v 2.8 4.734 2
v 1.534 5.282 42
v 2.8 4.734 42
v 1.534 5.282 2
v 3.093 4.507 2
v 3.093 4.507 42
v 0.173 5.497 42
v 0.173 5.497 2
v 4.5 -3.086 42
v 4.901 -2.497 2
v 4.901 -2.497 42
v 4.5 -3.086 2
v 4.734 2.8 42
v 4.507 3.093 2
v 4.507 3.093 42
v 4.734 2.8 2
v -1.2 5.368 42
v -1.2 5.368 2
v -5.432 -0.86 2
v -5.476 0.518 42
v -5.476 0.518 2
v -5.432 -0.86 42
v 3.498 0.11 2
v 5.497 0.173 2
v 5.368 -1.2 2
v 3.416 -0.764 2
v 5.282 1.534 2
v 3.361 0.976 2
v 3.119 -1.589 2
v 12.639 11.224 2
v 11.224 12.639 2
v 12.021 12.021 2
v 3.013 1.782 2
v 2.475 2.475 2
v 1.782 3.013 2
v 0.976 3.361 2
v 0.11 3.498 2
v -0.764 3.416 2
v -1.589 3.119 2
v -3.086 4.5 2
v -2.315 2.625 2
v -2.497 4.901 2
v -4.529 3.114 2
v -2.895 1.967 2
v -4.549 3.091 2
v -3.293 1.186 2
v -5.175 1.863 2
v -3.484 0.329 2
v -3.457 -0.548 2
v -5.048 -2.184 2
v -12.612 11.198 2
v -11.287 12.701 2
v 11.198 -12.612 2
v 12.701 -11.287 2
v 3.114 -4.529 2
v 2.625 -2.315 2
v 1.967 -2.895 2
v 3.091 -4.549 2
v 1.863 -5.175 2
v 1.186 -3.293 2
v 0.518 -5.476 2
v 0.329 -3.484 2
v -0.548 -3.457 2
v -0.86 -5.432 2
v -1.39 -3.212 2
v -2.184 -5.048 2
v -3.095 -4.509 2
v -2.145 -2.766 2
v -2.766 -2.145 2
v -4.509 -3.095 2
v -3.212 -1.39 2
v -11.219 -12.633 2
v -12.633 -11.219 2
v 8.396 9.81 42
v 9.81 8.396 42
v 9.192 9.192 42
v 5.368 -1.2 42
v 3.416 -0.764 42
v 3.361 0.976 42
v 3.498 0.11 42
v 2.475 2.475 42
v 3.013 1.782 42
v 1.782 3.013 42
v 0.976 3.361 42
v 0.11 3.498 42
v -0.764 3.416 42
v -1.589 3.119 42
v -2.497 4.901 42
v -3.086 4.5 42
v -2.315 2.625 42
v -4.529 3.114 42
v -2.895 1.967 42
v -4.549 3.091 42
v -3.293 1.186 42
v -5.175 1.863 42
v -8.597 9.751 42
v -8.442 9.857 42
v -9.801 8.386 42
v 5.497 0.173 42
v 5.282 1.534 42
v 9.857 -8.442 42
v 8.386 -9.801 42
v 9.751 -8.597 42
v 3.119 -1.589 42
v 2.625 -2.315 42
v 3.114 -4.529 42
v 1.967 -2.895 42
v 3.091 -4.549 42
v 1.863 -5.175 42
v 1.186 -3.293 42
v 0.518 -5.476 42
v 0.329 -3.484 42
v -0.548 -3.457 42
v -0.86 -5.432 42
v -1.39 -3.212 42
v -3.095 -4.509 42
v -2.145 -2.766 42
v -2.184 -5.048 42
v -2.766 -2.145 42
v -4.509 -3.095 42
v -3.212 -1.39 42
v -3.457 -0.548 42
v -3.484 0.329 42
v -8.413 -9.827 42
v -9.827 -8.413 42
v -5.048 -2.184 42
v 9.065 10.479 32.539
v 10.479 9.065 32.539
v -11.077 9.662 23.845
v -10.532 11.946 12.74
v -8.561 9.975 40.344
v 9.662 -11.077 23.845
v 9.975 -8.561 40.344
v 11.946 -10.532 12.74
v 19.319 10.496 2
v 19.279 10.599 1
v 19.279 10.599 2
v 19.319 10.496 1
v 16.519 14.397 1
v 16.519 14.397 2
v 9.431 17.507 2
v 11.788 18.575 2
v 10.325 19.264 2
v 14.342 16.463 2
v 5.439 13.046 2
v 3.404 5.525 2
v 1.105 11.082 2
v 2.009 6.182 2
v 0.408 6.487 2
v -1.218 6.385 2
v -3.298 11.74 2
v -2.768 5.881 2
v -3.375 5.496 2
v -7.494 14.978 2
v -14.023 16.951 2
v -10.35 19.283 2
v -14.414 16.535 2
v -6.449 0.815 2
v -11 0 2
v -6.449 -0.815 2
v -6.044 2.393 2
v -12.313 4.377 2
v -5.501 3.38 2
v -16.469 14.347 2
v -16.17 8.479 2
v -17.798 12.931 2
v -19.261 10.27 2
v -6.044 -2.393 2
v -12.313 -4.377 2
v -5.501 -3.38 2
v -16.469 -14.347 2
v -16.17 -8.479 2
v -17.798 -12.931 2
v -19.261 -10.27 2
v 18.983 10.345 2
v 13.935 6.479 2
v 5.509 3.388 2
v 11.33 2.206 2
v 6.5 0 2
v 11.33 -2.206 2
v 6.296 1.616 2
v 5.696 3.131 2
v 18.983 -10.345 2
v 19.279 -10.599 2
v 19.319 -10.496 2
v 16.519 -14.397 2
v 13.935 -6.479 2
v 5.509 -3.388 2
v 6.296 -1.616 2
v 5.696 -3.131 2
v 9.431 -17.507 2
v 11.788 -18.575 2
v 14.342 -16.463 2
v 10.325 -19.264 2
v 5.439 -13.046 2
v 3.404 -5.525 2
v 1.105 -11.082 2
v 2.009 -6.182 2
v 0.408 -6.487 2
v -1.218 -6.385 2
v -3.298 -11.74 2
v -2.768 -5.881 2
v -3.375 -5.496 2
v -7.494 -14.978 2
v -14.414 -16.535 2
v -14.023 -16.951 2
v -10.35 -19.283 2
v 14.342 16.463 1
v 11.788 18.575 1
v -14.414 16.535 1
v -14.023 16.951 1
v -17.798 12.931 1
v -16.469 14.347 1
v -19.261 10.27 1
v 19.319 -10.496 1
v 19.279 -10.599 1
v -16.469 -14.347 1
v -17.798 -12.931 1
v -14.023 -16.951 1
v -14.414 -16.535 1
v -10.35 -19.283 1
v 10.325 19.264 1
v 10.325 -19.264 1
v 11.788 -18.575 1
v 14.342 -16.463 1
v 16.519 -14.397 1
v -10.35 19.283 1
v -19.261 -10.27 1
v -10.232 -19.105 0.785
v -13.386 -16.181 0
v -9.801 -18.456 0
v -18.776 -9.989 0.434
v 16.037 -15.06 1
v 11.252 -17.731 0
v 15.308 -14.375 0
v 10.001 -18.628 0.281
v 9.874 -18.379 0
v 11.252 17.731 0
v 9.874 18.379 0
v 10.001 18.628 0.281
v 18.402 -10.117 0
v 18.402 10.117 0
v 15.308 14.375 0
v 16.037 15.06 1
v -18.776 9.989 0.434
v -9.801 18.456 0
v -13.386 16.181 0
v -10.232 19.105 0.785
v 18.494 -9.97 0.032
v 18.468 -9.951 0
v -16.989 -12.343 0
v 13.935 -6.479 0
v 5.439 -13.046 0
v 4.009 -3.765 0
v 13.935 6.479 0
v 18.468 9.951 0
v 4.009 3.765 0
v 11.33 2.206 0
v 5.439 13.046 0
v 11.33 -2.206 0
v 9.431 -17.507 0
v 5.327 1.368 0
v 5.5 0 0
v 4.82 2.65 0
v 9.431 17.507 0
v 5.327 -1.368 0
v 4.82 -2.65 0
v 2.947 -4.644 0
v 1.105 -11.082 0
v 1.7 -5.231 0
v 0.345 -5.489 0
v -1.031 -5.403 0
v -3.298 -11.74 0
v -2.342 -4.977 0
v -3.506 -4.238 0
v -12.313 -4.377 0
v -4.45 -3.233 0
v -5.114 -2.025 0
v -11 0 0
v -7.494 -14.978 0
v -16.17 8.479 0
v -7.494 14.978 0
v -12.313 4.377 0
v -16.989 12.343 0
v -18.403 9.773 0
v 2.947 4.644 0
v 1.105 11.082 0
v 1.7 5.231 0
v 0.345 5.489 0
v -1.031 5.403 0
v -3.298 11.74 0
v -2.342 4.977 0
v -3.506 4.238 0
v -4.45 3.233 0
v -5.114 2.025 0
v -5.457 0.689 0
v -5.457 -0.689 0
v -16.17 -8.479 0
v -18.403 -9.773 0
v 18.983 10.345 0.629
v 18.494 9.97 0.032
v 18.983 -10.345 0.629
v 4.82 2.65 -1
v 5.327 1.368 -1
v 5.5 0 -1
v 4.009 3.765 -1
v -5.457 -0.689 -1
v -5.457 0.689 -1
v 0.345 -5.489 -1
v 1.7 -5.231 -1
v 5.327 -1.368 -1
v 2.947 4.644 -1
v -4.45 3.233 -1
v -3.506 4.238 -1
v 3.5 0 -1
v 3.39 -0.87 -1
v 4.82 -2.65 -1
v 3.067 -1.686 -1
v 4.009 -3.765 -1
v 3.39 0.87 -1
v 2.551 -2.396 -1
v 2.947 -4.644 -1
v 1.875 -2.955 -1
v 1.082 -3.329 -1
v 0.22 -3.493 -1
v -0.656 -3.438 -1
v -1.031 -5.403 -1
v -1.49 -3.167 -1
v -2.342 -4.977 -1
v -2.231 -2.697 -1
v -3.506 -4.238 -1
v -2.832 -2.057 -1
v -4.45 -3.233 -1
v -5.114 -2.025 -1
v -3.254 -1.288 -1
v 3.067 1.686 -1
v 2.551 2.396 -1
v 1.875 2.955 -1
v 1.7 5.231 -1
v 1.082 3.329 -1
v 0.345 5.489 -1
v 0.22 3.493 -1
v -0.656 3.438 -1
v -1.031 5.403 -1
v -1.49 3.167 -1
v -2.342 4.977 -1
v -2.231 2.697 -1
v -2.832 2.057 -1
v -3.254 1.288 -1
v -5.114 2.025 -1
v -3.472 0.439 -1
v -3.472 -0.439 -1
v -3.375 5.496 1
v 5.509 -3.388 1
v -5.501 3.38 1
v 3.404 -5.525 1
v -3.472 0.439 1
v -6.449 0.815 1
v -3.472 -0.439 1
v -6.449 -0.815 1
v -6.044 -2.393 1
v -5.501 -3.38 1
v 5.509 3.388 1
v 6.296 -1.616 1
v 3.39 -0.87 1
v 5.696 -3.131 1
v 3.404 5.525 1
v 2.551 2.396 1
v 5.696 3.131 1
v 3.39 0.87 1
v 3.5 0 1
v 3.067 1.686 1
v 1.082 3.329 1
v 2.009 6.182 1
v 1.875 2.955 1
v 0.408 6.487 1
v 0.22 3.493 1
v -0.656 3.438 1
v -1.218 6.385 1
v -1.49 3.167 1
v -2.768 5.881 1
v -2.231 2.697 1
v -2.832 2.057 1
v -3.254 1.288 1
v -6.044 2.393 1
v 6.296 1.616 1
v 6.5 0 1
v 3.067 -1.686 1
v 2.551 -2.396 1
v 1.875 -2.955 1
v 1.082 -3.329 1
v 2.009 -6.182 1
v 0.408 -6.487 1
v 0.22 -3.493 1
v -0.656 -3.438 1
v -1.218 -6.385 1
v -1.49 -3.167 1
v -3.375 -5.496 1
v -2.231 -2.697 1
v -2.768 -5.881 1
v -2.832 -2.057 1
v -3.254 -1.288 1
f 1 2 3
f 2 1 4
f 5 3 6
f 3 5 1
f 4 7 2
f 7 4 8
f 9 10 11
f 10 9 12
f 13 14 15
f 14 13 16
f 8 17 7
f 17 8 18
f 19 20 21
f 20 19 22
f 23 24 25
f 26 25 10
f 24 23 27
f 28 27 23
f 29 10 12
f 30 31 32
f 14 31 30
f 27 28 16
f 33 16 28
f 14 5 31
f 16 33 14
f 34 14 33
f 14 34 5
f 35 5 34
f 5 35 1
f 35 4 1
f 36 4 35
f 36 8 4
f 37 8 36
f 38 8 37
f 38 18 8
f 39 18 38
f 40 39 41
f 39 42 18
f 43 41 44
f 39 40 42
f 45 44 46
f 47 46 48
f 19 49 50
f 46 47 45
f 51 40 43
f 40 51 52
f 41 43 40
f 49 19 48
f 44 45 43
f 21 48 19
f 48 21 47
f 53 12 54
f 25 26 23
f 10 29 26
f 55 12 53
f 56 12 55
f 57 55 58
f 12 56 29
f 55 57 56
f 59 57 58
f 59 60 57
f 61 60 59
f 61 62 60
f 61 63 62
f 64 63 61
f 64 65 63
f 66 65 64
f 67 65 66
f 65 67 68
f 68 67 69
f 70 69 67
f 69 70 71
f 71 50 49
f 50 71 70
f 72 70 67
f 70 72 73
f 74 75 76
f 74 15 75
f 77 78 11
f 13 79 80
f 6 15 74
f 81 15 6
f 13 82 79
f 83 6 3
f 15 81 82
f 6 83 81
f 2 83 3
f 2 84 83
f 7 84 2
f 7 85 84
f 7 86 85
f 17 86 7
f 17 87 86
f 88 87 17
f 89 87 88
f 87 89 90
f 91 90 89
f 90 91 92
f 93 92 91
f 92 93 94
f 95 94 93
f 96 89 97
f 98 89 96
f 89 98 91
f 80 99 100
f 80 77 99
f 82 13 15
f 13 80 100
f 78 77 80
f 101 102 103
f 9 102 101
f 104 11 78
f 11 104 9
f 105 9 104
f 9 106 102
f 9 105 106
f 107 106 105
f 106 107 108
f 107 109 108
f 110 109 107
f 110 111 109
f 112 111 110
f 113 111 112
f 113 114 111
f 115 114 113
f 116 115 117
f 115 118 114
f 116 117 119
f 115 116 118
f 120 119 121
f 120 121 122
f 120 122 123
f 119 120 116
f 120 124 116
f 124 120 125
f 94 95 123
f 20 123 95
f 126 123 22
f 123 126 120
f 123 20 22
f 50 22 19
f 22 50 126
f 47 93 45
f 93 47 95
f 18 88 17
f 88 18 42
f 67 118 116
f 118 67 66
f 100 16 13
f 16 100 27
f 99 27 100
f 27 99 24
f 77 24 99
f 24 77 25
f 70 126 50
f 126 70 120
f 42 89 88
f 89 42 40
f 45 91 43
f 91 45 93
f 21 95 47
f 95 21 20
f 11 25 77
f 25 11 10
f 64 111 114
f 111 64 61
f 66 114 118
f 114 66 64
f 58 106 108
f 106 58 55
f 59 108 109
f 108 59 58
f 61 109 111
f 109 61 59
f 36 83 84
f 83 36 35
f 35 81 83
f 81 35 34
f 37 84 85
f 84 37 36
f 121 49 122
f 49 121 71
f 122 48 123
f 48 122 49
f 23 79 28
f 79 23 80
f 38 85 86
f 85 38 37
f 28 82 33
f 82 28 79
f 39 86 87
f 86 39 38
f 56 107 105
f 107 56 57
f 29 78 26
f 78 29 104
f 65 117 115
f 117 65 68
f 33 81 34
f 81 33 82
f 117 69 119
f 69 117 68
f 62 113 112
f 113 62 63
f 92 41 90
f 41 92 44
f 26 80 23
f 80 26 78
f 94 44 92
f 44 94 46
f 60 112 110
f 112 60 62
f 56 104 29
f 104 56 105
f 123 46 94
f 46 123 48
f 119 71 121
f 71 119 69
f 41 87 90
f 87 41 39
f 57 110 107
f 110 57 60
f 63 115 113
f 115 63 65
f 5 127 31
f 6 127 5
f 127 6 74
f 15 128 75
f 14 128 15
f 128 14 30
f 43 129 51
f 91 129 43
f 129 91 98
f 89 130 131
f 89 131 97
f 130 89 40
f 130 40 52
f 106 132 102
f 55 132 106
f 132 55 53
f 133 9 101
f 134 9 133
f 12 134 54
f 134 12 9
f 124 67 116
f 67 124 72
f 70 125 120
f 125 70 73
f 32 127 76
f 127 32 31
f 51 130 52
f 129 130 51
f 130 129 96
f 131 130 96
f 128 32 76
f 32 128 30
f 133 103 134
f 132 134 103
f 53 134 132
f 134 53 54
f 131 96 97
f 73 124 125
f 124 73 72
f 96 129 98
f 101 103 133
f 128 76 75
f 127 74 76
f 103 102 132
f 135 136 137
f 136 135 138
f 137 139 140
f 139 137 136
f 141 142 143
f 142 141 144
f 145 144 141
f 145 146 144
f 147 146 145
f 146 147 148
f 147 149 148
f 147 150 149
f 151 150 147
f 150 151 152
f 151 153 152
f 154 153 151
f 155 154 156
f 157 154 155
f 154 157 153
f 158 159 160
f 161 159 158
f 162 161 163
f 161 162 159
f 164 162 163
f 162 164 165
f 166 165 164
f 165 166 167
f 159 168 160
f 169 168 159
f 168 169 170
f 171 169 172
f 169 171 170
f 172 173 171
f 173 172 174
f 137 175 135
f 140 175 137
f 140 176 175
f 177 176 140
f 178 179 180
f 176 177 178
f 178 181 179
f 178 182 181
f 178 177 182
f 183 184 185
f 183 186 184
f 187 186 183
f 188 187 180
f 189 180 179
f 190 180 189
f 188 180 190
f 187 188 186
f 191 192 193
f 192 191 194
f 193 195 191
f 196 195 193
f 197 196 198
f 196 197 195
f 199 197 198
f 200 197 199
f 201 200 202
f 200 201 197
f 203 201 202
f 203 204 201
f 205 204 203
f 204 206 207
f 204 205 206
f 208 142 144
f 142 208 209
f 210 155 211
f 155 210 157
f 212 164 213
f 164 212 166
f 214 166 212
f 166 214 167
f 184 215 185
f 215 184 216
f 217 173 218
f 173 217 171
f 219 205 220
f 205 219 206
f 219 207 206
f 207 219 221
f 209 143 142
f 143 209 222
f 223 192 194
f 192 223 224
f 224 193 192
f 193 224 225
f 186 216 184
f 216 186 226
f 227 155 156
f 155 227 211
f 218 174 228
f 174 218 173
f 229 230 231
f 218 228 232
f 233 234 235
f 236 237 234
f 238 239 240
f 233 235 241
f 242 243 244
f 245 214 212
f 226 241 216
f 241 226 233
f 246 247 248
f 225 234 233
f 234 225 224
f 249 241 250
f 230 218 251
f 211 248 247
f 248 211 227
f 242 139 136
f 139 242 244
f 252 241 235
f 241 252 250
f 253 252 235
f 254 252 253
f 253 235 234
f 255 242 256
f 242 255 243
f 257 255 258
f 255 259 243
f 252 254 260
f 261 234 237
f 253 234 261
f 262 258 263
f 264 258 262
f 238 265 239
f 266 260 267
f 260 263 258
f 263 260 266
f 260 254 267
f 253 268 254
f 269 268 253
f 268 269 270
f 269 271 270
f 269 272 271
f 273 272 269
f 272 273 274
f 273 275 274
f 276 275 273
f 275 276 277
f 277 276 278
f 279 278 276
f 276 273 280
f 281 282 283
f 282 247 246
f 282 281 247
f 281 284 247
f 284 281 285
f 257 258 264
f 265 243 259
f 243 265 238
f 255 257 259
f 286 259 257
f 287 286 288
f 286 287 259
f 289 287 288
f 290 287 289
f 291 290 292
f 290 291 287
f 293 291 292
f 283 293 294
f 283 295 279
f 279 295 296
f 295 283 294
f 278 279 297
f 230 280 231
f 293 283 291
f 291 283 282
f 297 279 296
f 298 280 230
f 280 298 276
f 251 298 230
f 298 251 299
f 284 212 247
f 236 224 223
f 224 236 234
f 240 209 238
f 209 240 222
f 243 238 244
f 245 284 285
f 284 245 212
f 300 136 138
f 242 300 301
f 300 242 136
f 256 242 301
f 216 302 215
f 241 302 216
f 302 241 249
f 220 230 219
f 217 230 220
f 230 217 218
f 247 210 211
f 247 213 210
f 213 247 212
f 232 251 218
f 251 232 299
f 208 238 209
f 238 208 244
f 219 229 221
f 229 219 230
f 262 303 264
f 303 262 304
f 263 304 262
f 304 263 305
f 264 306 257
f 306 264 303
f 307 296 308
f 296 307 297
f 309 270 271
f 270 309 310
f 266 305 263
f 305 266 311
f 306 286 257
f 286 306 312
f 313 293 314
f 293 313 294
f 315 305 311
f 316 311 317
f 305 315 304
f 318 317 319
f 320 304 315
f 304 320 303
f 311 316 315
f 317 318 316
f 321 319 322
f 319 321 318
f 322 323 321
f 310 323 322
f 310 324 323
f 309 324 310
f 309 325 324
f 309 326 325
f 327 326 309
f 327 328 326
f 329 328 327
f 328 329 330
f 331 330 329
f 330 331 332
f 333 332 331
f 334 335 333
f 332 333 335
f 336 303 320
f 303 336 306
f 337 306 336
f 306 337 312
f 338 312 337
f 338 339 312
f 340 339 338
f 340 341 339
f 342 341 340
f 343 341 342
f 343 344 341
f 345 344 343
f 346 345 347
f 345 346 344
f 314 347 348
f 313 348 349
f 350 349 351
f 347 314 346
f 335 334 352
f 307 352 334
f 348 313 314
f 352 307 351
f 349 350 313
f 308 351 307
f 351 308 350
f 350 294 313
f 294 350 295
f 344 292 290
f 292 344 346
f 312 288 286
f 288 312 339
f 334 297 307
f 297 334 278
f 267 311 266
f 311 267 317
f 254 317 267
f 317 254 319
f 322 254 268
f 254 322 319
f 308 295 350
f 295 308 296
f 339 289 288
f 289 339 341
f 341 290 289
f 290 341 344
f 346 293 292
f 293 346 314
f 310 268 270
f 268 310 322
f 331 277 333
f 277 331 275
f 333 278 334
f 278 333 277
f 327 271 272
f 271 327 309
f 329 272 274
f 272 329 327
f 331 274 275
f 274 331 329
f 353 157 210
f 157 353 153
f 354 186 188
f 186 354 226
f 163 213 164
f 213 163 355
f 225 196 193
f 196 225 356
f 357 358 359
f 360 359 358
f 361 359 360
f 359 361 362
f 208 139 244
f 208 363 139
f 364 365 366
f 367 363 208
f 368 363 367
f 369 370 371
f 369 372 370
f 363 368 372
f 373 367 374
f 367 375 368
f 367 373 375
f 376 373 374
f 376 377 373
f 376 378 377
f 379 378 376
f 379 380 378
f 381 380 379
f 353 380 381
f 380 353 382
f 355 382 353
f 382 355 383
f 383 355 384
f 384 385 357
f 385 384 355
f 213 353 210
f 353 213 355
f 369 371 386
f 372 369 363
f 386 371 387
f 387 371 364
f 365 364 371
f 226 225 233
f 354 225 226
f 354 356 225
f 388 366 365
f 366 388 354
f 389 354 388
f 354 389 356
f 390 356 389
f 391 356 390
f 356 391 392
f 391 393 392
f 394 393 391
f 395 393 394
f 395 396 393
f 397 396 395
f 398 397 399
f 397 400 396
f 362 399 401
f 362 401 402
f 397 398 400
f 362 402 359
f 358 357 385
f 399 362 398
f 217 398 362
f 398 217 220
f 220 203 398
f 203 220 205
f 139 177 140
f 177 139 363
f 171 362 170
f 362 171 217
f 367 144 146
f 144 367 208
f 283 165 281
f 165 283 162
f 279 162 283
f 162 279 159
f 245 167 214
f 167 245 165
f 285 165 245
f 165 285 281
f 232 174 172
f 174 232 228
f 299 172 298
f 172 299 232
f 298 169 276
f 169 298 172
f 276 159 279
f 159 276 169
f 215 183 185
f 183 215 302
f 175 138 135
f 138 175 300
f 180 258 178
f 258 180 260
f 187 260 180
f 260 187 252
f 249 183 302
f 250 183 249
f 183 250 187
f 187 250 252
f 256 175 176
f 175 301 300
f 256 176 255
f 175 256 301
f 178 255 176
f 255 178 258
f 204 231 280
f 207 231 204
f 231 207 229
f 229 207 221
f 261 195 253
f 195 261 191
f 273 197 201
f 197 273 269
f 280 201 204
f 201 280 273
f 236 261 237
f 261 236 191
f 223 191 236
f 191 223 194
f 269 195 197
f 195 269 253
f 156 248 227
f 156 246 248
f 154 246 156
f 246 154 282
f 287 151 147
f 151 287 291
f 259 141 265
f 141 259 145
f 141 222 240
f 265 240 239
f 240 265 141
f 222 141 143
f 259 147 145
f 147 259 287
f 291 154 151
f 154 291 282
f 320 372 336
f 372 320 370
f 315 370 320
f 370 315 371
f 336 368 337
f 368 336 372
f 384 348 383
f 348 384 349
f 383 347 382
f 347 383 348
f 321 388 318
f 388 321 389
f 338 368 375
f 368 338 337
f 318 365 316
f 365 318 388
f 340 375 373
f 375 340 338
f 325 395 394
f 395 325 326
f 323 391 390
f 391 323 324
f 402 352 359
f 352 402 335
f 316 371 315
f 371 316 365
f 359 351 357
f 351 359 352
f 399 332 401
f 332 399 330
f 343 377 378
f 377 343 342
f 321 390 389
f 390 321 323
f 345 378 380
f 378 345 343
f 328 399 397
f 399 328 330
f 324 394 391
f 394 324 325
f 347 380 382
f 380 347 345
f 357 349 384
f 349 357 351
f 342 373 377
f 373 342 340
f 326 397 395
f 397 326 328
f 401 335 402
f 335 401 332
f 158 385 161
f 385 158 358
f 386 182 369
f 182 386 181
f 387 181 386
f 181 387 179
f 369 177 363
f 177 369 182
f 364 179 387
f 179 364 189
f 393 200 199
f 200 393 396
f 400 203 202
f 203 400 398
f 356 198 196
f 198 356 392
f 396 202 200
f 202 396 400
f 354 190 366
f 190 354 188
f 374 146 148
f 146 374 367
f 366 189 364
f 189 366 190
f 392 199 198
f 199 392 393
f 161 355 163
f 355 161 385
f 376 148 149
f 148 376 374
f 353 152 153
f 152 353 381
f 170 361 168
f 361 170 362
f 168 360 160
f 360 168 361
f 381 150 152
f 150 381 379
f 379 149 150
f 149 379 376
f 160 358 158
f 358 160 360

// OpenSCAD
$fn=25;
d1 = 34;
d2 = 26;
d3 = 7;
h = 40;

module holder() {

    intersection(){
        union(){
            rotate([0,0,0]) translate([d3/2,-1,0]) cube([d1/2,2,h]);

            rotate([0,0,90]) translate([d3/2,-1,0]) cube([d1/2,2,h]);

            rotate([0,0,-90]) translate([d3/2,-1,0]) cube([d1/2,2,h]);

            rotate([0,0,180]) translate([d3/2,-1,0]) cube([d1/2,2,h]);

            difference(){
                cylinder(d=d3+4, h = h);
                cylinder(d=d3, h = h);
            }
        }
        cylinder(d1=d1, d2=d2, h=h);
    }
}

module base(){
    d = 44;
    
    difference(){
        union(){
            translate([0,0,1]) cylinder(d=d, h=1);
            cylinder(d1=d-2, d2=d, h=1);
            translate([0,0,-1]) cylinder(d=d3+4,h=1);
            

        }
        
        union(){
            //cutouts
            translate([-d * 1.2,0,0]) scale([1.9, 0.8, 1]) cylinder(d=d,h=2);
            translate([ d * 1.2,0,0]) scale([1.9, 0.8, 1]) cylinder(d=d,h=2);
            translate([0 ,-d * 1.2,0]) scale([0.8, 1.9, 1]) cylinder(d=d,h=2);
            translate([0,d * 1.2, 0]) scale([0.8, 1.9, 1]) cylinder(d=d,h=2);
            //lower rest
            translate([0,0,-1]) cylinder(d=d3,h=2+1);

            //cutouts
            translate([0,0,1]) cylinder(d=d3+6,h=1);
            for(i = [0:1])
            rotate([0,0,45 + 90*i])
            union() {
                translate([-1.5,-d/2,1]) cube([2+1,d,1]);
                //translate([-3-1,-d/2,2]) cube([2,d,1]);
            }
        }
    }
    

}

module foot() {

    d = 20;
    
    difference() {
        union(){
            cylinder(d=d+5,h=2);
            cylinder(d=d,h=4);
        }
         cylinder(d=d-5,h=1);
    }
}

//foot();

translate([0,0,2])  rotate([0,0,45]) holder();
 base();
